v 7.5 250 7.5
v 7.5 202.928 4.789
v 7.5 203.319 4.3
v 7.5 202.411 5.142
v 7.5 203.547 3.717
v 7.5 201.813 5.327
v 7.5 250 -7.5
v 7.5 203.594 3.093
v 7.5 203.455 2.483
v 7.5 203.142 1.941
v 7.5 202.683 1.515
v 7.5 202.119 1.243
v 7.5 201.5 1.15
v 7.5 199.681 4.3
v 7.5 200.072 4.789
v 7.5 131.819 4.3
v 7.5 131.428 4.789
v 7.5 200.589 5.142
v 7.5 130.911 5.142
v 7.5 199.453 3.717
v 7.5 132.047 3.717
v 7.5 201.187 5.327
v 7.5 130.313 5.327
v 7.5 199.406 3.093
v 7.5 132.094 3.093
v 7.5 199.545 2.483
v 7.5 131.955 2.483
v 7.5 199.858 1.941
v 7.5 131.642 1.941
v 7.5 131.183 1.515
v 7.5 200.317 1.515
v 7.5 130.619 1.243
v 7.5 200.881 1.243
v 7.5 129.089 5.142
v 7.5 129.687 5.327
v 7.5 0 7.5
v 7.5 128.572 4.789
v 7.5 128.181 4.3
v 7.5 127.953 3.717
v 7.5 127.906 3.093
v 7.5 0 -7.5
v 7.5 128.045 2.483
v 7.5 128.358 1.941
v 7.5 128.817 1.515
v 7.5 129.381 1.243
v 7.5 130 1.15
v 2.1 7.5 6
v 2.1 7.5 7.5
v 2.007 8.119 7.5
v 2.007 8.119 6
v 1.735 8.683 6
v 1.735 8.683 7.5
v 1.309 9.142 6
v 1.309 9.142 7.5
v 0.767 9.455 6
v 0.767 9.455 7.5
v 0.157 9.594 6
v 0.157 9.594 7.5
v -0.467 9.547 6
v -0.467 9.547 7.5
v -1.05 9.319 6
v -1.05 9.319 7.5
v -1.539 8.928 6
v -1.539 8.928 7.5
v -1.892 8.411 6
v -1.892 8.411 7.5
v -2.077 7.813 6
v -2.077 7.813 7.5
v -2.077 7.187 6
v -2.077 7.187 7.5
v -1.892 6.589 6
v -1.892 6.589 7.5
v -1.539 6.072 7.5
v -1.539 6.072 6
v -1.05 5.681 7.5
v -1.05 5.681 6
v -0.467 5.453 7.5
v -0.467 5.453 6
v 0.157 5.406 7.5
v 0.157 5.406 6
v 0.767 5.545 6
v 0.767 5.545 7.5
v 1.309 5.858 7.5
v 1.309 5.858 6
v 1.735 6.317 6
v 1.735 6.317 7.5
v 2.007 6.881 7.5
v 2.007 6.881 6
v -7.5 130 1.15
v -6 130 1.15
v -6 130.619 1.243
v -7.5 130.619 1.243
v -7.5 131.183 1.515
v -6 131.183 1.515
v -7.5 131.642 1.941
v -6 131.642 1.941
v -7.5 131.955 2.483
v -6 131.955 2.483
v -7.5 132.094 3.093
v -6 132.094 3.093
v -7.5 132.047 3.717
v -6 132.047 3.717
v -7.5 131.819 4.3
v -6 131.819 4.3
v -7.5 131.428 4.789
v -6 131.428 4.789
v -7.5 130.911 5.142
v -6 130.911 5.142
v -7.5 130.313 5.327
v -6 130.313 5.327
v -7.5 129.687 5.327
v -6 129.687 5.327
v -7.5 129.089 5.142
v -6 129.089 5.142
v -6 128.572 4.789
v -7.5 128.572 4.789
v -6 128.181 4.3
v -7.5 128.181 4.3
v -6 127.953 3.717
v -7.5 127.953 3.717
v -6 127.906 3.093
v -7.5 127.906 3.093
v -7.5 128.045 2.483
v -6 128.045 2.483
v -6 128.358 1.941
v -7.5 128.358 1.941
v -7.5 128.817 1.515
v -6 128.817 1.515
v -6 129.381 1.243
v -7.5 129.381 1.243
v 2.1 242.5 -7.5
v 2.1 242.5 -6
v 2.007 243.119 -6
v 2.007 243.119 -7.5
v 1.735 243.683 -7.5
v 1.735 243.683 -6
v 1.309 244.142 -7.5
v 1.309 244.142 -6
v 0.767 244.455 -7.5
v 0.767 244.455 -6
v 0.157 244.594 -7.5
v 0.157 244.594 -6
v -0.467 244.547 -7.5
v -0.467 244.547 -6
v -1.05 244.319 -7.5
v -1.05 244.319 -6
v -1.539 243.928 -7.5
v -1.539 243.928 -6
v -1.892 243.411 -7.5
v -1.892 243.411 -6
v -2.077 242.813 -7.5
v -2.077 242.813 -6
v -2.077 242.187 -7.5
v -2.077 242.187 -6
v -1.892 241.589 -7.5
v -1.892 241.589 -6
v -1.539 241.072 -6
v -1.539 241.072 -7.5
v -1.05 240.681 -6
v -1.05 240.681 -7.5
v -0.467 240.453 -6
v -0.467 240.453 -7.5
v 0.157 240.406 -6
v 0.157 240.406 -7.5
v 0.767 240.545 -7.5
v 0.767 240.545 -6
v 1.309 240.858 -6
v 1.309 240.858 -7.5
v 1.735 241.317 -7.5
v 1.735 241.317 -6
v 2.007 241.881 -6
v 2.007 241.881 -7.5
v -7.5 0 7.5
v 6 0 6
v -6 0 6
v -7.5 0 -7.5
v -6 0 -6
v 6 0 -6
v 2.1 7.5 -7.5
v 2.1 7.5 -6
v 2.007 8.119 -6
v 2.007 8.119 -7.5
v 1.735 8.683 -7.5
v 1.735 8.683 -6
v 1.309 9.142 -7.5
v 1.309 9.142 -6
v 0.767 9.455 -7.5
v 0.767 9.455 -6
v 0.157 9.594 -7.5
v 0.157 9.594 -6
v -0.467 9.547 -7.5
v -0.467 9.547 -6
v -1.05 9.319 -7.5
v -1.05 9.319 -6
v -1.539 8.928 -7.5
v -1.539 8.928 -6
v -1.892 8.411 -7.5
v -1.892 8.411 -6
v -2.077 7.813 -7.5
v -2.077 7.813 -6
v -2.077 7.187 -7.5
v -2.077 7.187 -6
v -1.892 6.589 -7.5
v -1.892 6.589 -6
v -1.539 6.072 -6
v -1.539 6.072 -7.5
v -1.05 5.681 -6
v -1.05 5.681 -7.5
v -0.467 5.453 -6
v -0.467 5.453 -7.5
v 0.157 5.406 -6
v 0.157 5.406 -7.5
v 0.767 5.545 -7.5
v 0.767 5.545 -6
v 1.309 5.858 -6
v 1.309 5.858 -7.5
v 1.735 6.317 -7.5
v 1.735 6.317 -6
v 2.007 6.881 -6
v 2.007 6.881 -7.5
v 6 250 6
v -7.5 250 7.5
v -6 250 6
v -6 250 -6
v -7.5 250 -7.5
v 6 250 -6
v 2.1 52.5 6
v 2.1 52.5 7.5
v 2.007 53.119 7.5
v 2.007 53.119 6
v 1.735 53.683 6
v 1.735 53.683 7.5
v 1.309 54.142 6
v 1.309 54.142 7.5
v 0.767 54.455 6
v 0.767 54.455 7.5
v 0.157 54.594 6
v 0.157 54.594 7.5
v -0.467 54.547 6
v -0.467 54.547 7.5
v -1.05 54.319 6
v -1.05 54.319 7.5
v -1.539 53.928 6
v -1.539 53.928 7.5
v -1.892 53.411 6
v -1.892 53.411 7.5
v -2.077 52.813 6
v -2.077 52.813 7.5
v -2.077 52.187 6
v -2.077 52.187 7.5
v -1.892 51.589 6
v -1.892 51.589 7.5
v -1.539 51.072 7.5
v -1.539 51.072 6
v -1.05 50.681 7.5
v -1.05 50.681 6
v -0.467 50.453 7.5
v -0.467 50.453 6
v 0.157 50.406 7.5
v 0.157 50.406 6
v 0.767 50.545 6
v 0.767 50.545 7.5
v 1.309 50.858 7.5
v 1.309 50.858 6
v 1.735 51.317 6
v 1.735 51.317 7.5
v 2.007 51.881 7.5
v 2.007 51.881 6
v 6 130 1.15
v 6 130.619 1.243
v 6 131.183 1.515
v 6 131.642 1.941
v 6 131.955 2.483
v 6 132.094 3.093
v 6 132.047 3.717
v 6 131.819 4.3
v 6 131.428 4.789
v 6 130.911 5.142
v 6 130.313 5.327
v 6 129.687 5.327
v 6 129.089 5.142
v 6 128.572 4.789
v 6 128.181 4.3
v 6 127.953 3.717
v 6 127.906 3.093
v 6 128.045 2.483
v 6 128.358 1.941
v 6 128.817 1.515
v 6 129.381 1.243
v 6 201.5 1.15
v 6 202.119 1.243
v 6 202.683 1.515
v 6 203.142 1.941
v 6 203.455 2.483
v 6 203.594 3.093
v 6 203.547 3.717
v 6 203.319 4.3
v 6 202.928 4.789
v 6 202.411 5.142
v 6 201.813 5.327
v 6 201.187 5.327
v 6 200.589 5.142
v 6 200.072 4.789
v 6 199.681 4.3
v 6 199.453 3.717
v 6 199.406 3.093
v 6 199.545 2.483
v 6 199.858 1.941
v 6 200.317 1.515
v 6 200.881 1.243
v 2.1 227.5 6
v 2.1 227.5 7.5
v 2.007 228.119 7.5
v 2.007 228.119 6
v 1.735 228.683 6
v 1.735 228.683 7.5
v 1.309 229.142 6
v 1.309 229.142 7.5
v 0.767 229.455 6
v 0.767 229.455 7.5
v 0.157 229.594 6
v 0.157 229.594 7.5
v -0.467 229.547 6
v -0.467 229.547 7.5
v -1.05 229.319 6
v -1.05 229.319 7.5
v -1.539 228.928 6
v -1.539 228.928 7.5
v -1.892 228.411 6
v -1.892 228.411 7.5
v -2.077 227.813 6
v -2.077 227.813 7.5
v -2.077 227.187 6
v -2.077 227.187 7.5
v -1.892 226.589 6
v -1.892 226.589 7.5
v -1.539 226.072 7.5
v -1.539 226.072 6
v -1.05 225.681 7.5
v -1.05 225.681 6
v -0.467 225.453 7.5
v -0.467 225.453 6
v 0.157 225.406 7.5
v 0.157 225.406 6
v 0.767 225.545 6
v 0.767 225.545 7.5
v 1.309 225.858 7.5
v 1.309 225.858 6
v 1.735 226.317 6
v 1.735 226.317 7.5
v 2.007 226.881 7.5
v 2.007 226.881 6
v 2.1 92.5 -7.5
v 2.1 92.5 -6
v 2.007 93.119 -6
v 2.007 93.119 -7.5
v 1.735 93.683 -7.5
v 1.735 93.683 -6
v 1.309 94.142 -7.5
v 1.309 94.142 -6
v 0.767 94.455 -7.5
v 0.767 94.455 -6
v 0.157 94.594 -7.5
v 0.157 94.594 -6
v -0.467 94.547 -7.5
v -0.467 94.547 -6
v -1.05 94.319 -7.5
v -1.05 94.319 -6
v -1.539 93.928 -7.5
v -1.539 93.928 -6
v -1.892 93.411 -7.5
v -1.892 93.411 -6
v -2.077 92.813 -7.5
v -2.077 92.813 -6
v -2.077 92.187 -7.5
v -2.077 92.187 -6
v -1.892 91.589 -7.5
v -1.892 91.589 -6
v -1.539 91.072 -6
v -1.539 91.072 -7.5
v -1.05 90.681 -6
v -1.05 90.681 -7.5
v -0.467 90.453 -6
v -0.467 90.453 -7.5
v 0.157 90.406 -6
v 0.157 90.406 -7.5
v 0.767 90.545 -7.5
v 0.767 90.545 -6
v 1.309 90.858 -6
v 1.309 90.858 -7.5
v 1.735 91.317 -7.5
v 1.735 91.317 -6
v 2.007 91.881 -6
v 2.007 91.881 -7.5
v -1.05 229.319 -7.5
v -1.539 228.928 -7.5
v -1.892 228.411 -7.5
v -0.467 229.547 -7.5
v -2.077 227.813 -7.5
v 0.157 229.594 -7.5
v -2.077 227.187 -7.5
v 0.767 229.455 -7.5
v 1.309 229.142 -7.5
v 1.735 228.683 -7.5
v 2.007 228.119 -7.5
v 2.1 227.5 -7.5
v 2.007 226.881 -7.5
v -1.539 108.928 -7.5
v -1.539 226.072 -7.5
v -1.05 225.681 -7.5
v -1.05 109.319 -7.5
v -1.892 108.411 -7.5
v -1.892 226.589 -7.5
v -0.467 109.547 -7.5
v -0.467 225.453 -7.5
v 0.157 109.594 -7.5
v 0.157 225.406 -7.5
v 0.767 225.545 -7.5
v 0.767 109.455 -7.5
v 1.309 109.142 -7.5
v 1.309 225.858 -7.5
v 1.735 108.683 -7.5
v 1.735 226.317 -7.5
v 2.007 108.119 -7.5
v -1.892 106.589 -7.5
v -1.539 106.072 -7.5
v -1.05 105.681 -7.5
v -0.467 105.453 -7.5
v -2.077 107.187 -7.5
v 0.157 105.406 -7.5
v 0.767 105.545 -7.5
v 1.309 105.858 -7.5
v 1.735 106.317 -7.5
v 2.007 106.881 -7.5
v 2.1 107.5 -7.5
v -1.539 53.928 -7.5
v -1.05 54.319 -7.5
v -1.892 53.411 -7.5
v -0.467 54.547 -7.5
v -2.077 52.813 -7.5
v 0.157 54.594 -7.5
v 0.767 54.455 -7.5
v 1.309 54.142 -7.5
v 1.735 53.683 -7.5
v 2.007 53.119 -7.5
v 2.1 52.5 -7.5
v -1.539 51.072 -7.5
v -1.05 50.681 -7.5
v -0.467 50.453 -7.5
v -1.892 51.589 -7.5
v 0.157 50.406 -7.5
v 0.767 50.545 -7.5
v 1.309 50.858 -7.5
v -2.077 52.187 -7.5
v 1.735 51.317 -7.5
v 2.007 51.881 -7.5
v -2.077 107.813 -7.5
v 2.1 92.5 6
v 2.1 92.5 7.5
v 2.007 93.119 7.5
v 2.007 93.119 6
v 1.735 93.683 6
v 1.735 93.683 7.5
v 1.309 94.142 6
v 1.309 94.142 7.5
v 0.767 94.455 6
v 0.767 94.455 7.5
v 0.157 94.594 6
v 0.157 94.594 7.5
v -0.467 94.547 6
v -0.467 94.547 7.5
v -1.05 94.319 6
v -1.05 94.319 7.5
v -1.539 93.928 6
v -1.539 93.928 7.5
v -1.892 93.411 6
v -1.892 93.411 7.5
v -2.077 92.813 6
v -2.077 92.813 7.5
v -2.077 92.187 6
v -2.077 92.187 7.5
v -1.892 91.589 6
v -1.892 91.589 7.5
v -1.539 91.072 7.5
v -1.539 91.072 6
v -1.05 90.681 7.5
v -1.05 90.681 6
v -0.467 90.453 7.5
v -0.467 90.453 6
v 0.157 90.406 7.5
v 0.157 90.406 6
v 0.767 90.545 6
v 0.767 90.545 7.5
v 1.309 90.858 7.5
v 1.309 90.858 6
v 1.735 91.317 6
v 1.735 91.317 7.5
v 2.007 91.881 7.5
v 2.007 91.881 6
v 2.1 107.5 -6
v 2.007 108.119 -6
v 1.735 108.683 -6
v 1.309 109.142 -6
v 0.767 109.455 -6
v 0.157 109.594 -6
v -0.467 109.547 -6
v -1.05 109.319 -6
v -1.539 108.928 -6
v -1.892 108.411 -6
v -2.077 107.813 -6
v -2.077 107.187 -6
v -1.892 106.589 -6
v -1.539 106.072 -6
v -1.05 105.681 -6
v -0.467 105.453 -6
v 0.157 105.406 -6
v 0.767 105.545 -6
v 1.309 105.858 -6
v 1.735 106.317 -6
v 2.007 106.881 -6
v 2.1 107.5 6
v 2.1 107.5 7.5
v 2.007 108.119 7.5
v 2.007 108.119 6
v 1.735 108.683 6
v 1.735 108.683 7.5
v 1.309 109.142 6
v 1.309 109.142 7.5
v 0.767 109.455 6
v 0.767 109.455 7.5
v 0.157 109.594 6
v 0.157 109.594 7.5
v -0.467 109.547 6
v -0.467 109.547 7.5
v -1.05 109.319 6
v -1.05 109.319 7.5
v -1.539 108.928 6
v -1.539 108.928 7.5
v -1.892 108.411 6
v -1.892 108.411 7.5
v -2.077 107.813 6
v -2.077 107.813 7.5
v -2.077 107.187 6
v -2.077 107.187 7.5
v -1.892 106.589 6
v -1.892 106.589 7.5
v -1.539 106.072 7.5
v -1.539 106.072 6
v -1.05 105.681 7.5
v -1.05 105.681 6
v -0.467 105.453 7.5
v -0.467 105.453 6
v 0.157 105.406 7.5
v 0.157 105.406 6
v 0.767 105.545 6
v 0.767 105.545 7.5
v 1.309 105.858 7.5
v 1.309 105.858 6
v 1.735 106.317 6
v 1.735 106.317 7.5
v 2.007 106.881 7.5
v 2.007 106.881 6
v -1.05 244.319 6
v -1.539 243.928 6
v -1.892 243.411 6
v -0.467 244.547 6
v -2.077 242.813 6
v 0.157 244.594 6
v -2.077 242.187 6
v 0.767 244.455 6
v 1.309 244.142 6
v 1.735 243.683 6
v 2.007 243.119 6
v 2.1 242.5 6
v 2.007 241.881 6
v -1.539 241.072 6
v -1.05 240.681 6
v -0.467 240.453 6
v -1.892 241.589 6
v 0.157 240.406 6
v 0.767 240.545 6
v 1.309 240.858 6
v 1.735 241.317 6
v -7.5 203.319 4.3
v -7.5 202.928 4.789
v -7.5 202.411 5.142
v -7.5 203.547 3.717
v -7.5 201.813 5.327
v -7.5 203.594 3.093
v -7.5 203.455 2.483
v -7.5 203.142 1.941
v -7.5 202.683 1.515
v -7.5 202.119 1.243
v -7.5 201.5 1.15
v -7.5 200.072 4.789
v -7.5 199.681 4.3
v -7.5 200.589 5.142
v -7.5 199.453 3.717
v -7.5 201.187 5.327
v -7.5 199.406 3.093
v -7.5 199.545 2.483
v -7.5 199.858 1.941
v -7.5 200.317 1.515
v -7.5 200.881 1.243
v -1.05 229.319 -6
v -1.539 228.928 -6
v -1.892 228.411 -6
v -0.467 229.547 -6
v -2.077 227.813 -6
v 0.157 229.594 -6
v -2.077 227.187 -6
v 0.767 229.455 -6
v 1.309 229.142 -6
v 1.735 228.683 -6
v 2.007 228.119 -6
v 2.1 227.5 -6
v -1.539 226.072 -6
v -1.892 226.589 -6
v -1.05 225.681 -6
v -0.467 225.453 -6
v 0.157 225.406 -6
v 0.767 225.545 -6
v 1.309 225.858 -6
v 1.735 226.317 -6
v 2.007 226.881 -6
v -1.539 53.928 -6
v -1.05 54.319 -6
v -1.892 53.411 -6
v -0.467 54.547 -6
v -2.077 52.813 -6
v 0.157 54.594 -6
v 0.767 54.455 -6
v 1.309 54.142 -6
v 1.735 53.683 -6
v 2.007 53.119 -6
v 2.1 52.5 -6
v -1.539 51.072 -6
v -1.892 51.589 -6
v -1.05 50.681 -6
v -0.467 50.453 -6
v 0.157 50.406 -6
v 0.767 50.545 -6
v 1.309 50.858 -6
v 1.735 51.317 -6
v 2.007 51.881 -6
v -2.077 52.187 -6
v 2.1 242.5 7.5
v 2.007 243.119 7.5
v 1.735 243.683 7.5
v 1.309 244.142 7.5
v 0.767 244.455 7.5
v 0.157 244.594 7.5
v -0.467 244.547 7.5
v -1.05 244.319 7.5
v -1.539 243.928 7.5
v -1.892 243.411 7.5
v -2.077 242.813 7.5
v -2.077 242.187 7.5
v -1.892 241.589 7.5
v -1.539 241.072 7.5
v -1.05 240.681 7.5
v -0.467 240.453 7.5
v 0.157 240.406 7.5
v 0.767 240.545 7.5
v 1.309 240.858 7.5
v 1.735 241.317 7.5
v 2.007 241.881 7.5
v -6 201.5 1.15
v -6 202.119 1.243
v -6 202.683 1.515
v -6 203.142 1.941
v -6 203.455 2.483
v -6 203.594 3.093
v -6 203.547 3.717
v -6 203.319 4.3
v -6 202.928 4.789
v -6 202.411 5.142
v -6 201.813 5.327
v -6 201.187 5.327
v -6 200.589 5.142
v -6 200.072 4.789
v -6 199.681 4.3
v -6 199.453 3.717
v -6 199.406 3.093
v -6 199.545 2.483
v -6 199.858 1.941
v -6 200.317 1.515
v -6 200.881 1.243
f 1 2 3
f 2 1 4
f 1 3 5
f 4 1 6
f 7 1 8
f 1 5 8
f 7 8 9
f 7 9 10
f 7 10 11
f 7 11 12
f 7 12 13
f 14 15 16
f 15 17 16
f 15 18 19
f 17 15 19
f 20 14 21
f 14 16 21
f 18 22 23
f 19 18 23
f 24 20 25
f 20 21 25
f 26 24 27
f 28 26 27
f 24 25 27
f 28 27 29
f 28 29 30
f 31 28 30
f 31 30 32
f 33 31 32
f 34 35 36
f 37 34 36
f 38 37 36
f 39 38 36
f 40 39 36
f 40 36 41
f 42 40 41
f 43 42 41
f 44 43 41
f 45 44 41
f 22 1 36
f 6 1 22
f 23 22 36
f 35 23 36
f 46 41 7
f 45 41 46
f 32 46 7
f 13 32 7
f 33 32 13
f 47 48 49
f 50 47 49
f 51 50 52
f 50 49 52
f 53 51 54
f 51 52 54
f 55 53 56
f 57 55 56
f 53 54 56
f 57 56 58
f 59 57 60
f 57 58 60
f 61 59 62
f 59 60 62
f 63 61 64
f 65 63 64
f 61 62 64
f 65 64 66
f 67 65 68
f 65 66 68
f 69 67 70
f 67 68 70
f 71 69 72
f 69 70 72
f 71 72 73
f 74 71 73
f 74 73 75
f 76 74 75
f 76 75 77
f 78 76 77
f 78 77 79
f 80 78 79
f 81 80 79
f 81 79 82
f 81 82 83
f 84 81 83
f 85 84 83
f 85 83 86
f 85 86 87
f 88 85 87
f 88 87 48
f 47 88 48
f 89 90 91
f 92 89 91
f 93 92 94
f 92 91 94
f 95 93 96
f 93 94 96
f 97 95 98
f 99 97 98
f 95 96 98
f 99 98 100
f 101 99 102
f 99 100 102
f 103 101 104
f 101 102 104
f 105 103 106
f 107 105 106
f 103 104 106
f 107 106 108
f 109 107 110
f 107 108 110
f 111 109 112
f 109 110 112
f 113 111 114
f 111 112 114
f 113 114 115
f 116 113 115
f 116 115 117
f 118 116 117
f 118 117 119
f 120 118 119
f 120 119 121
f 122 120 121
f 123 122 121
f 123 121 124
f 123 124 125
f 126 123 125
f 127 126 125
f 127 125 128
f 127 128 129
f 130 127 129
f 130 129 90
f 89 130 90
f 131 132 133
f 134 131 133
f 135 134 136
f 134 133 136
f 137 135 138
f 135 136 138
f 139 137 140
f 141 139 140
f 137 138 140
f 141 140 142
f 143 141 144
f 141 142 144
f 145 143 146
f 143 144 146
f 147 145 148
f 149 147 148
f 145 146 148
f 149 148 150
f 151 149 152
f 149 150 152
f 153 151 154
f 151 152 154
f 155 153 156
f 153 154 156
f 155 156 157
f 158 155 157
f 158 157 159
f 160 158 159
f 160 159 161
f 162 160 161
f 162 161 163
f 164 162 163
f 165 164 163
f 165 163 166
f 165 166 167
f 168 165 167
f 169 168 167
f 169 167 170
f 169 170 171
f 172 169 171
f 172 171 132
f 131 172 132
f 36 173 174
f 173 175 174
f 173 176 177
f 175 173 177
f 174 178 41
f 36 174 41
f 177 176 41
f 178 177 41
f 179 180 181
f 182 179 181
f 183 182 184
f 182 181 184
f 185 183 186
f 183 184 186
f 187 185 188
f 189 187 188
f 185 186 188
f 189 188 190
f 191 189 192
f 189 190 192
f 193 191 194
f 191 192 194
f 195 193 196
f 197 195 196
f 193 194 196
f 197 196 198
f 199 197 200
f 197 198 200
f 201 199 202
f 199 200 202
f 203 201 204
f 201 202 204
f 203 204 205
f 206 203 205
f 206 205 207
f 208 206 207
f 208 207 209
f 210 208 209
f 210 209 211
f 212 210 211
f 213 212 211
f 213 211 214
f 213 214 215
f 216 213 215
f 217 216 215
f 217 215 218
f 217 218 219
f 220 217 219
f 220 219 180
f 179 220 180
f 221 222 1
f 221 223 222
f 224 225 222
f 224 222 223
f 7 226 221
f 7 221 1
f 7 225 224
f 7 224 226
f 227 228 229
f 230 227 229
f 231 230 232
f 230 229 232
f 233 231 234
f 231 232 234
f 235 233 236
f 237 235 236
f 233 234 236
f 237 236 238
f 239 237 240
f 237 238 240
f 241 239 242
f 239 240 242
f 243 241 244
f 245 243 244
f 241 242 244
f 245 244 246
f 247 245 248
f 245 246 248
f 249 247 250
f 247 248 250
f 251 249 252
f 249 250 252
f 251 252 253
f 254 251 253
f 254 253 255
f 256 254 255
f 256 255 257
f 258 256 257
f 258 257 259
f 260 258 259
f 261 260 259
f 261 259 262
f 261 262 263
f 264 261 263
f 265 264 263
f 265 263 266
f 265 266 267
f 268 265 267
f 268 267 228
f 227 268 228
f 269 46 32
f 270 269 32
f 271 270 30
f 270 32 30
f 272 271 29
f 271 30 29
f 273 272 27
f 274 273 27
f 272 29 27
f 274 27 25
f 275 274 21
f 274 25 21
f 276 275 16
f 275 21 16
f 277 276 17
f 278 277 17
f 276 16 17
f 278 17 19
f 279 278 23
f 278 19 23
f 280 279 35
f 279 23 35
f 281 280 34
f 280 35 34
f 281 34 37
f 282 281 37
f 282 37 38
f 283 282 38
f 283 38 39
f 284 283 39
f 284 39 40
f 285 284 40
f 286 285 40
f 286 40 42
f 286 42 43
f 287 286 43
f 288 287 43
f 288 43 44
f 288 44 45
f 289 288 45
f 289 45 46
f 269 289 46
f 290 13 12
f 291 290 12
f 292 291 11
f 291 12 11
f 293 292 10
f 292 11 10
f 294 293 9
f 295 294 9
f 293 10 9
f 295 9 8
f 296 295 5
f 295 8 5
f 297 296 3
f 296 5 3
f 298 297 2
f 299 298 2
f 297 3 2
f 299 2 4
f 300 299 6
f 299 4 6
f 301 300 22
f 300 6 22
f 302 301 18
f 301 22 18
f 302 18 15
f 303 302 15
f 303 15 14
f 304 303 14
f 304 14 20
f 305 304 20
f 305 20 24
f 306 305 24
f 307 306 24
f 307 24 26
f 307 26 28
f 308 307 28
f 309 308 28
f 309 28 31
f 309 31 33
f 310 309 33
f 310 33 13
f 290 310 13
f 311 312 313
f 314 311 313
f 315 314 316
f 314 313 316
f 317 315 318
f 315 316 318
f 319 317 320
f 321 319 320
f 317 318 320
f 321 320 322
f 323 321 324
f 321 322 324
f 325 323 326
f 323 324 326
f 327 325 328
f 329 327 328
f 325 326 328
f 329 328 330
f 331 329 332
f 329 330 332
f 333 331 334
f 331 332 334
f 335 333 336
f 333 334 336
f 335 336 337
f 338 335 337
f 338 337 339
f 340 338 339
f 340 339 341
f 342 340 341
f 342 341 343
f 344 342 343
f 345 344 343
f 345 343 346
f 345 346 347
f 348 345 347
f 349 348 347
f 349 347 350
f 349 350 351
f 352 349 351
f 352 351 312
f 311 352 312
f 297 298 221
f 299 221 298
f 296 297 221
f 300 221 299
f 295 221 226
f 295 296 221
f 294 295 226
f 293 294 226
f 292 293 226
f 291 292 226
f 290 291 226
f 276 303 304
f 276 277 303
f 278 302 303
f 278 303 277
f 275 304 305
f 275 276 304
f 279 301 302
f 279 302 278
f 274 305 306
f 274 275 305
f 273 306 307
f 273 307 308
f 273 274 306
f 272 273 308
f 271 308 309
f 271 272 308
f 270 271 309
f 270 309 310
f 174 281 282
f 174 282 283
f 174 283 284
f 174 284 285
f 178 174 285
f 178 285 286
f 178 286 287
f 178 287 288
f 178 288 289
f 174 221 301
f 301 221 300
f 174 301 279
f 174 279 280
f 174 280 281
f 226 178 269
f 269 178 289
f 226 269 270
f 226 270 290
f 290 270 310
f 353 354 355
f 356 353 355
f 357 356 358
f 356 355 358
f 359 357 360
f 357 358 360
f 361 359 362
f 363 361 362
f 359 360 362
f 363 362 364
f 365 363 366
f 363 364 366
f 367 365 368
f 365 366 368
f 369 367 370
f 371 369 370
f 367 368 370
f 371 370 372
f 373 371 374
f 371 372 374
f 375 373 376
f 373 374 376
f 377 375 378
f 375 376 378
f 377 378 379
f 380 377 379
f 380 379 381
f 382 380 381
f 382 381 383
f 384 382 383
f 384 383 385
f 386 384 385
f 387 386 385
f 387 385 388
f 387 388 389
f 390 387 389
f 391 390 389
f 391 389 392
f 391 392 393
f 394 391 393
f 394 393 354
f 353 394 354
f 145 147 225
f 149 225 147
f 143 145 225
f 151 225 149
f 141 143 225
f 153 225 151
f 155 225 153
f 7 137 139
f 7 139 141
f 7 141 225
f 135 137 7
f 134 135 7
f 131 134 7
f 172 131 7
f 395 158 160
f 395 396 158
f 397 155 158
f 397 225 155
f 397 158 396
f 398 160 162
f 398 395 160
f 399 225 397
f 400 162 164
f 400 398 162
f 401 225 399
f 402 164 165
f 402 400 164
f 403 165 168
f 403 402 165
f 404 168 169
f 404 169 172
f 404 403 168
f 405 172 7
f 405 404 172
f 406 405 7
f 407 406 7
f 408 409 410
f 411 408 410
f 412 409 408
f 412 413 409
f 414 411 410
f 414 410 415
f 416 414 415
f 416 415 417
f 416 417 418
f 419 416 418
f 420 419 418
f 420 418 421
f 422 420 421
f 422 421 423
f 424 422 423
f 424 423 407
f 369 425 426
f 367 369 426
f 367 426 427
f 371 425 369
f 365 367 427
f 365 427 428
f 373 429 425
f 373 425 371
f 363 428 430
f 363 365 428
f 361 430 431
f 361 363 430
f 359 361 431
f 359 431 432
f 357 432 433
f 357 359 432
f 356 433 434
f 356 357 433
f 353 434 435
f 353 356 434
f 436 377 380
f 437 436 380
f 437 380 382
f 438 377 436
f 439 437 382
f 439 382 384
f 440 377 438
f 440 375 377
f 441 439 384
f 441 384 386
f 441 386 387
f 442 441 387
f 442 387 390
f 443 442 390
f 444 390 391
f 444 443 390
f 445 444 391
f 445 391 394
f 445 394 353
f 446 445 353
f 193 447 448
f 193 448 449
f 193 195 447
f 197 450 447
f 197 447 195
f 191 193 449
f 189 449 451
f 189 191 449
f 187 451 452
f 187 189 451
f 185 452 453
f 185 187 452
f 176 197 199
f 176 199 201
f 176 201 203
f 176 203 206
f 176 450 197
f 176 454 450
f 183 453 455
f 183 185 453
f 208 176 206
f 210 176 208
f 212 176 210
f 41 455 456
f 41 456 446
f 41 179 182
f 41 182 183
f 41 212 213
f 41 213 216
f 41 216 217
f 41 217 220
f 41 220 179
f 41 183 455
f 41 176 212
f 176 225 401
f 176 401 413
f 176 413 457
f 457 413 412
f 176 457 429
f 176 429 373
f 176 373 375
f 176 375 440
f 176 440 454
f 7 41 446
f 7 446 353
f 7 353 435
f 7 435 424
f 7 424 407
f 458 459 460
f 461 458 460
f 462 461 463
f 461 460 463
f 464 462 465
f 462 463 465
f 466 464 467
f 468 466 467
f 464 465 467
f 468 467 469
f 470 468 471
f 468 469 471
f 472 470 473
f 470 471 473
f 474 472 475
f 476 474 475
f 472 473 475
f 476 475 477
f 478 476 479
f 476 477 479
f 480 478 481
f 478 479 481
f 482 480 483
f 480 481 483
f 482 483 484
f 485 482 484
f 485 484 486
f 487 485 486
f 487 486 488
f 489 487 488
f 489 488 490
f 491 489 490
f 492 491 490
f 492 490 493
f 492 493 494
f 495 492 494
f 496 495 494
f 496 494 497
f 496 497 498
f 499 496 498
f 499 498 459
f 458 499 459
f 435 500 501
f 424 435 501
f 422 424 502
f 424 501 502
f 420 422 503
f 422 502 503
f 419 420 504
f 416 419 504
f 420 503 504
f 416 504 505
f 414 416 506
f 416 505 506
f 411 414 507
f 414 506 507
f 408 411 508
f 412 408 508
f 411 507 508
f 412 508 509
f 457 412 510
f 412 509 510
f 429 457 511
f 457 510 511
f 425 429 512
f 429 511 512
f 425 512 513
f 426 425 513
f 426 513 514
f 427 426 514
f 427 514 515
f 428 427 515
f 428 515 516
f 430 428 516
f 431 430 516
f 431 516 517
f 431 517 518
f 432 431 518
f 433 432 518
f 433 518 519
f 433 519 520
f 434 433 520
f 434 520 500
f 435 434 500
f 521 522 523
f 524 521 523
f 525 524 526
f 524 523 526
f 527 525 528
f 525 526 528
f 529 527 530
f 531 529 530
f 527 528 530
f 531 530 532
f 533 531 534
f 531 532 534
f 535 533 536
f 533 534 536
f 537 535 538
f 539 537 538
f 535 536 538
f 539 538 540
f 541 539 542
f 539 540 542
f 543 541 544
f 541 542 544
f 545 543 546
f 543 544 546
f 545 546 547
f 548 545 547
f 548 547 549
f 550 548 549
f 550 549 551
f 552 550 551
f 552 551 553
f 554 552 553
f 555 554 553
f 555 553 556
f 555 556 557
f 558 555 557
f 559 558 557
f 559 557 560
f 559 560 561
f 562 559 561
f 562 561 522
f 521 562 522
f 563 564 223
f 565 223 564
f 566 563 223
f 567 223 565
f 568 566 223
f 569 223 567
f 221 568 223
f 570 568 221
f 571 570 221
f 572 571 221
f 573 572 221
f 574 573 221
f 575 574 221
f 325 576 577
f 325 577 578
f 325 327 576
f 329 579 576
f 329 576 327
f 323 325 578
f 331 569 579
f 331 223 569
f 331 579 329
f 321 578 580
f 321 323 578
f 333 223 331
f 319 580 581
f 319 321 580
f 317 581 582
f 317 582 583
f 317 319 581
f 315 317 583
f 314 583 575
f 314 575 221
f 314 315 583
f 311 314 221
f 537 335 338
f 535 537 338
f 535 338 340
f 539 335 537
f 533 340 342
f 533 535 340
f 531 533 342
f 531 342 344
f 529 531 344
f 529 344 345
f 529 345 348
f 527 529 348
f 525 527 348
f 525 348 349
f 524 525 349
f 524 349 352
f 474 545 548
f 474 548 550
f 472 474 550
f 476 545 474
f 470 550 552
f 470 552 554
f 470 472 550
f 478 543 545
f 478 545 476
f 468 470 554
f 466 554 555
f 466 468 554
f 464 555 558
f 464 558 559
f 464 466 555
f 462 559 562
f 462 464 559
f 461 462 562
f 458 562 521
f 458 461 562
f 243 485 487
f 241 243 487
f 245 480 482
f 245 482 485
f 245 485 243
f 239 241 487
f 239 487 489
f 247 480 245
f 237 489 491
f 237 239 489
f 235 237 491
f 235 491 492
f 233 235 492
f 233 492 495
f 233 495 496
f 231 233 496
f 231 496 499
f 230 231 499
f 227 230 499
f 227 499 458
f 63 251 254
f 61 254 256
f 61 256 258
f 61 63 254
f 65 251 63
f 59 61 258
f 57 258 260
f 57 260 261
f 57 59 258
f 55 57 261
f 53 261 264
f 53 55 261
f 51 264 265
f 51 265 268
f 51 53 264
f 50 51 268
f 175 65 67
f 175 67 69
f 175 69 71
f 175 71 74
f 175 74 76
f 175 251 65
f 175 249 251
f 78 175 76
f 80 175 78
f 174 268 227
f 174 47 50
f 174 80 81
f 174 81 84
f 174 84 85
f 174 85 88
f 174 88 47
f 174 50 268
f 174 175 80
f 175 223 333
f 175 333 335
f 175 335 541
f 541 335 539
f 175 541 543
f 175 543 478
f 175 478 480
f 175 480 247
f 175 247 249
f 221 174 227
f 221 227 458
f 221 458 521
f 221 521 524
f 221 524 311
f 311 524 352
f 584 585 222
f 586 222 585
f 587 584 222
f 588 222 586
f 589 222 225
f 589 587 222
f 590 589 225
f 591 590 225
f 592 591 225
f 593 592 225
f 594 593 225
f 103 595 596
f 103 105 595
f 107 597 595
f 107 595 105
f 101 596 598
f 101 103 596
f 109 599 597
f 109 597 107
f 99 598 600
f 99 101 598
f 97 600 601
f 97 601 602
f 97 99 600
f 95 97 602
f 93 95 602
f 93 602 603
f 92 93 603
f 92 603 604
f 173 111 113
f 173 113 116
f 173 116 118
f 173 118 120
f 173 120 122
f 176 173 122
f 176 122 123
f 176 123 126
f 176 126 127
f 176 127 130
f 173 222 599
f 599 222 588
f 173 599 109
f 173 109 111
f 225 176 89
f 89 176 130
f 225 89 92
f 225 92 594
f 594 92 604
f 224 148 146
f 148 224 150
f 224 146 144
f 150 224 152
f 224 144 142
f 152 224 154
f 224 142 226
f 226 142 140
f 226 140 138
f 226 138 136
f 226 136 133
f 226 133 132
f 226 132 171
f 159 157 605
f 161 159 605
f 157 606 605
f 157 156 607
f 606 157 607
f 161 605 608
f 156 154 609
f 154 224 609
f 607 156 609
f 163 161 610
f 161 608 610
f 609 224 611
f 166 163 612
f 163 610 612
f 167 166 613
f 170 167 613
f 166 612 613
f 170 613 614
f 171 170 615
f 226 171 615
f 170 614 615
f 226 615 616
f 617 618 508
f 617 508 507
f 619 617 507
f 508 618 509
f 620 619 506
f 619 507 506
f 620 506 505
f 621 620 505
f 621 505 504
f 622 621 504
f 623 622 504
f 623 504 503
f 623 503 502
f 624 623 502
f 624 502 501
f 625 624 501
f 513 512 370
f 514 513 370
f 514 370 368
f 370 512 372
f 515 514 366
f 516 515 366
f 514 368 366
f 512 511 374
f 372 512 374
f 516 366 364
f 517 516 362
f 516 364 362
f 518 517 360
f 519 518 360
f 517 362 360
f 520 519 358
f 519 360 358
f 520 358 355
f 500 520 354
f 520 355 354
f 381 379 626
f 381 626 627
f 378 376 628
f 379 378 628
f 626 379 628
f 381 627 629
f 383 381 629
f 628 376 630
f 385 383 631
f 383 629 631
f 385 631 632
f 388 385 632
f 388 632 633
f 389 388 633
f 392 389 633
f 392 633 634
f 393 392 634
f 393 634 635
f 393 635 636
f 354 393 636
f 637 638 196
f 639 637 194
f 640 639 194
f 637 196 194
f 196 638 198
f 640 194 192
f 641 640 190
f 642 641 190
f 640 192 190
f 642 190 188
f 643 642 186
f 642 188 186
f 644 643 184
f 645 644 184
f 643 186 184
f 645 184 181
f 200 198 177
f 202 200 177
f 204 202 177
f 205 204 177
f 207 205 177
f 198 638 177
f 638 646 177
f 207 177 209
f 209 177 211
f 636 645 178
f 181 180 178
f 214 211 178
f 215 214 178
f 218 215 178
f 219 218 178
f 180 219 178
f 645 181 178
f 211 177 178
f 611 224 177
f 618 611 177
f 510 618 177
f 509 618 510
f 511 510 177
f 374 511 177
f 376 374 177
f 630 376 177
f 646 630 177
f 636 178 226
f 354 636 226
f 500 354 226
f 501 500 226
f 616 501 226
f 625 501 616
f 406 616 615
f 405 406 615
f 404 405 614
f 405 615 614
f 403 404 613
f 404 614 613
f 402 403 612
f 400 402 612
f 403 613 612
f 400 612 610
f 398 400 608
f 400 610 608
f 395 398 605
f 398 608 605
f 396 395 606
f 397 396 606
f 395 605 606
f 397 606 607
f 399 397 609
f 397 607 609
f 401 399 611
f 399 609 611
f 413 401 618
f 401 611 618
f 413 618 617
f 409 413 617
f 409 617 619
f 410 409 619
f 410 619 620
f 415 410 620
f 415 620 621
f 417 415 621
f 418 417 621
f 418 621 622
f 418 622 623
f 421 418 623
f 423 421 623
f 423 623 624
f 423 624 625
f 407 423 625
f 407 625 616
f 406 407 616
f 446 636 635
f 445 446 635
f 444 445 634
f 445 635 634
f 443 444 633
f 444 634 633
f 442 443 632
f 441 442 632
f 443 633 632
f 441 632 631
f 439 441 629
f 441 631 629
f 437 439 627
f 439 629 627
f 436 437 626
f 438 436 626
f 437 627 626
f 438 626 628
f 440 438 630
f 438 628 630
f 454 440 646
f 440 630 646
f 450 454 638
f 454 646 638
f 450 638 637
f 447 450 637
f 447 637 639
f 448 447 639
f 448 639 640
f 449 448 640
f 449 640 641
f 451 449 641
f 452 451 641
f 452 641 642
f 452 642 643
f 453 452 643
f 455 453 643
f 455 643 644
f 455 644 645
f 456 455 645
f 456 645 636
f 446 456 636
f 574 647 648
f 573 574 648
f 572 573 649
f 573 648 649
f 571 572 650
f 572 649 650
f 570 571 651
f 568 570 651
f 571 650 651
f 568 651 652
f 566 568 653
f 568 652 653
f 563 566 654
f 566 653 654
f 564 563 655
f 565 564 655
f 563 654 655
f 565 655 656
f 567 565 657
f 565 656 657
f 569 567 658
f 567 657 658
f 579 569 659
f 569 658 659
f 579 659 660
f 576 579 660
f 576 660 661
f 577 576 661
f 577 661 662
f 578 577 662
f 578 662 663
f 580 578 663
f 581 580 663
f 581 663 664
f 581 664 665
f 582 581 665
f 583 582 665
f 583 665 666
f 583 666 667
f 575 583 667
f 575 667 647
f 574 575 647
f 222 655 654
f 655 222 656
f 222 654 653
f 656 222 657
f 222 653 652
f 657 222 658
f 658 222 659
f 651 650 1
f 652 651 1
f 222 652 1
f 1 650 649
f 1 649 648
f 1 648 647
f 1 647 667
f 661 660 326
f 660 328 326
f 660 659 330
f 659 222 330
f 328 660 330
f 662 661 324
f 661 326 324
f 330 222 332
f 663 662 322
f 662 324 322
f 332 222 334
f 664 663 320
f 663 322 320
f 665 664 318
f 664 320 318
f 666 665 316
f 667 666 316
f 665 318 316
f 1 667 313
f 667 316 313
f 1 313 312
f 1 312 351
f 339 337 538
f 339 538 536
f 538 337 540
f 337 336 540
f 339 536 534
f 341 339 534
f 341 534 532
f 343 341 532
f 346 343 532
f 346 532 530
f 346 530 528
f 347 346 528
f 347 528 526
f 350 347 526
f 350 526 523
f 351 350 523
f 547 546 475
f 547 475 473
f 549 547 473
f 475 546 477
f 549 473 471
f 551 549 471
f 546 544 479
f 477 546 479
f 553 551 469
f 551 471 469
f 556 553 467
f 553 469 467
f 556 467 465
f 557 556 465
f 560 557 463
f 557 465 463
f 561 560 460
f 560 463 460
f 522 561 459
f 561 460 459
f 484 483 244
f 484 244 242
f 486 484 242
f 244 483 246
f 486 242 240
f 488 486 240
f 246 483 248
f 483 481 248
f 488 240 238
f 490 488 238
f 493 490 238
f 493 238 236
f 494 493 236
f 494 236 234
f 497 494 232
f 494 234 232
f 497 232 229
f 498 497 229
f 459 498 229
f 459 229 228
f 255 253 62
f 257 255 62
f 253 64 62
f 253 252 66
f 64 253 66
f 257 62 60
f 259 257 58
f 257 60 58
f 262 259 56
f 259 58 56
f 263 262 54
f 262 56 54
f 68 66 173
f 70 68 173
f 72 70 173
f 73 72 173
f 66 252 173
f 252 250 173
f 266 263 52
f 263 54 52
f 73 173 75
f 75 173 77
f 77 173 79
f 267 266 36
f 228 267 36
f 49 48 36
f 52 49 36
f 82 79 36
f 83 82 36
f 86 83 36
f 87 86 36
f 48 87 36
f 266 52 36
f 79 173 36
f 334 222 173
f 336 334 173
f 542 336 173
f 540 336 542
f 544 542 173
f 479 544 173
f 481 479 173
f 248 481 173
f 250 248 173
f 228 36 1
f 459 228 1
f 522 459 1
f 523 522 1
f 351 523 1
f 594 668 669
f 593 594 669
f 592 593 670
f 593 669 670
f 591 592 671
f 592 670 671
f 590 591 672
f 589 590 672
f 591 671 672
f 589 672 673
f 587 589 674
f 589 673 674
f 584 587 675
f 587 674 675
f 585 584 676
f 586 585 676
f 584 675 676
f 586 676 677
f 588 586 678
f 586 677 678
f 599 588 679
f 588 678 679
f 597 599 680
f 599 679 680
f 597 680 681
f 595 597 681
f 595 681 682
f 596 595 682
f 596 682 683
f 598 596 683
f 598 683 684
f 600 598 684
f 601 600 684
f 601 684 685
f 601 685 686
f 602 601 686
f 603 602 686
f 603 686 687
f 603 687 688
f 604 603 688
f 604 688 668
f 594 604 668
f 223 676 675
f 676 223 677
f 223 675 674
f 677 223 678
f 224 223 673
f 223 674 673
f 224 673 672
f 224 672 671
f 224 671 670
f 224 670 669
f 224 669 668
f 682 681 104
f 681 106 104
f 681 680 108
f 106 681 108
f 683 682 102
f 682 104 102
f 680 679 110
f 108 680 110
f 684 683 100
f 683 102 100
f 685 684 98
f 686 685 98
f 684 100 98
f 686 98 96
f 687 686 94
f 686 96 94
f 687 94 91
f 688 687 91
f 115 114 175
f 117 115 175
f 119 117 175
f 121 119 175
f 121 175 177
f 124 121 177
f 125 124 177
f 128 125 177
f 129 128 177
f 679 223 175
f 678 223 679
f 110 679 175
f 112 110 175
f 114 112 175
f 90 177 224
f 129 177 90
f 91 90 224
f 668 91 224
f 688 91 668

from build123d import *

# Parameters (mm, degrees)
SKETCH_1_W          = 15
SKETCH_1_H          = 15
SKETCH_1_W_2        = 12
SKETCH_1_H_2        = 12
EXTRUDE_1_DEPTH     = 250
SKETCH_2_R          = 2.1
CUT_EXTRUDE_1_DEPTH = 251.561868607
SKETCH_3_R          = 2.1
CUT_EXTRUDE_2_DEPTH = 251.561868607
SKETCH_4_R          = 2.1
CUT_EXTRUDE_3_DEPTH = 251.561868607
SKETCH_5_R          = 2.1
CUT_EXTRUDE_4_DEPTH = 251.561868607


with BuildPart() as part:
    # ｽｹｯﾁ1 → 押し出し-薄板1 (new body)
    with BuildSketch(Plane(origin=(0, 0, 0), x_dir=(1, 0, 0), z_dir=(0, 1, 0))):
        Rectangle(SKETCH_1_W, SKETCH_1_H)
        Rectangle(SKETCH_1_W_2, SKETCH_1_H_2, mode=Mode.SUBTRACT)
    extrude(amount=EXTRUDE_1_DEPTH)

    # ｽｹｯﾁ2 → ｶｯﾄ - 押し出し1 (cut, through all)
    with BuildSketch(Plane.XY.offset(7.5)):
        with Locations((0, 52.5)):
            Circle(SKETCH_2_R)
        with Locations((0, 7.5)):
            Circle(SKETCH_2_R)
    extrude(amount=-CUT_EXTRUDE_1_DEPTH, mode=Mode.SUBTRACT)

    # ｽｹｯﾁ3 → ｶｯﾄ - 押し出し2 (cut, through all)
    with BuildSketch(Plane.XY.offset(7.5)):
        with Locations((0, 107.5)):
            Circle(SKETCH_3_R)
        with Locations((0, 92.5)):
            Circle(SKETCH_3_R)
    extrude(amount=-CUT_EXTRUDE_2_DEPTH, mode=Mode.SUBTRACT)

    # ｽｹｯﾁ4 → ｶｯﾄ - 押し出し3 (cut, through all)
    with BuildSketch(Plane(origin=(7.5, 0, 0), x_dir=(0, 0, -1), z_dir=(1, 0, 0))):
        with Locations((-3.25, 130)):
            Circle(SKETCH_4_R)
        with Locations((-3.25, 201.5)):
            Circle(SKETCH_4_R)
    extrude(amount=-CUT_EXTRUDE_3_DEPTH, mode=Mode.SUBTRACT)

    # ｽｹｯﾁ5 → ｶｯﾄ - 押し出し4 (cut, through all)
    with BuildSketch(Plane.XY.offset(7.5)):
        with Locations((0, 227.5)):
            Circle(SKETCH_5_R)
        with Locations((0, 242.5)):
            Circle(SKETCH_5_R)
    extrude(amount=-CUT_EXTRUDE_4_DEPTH, mode=Mode.SUBTRACT)


solid = part.part
